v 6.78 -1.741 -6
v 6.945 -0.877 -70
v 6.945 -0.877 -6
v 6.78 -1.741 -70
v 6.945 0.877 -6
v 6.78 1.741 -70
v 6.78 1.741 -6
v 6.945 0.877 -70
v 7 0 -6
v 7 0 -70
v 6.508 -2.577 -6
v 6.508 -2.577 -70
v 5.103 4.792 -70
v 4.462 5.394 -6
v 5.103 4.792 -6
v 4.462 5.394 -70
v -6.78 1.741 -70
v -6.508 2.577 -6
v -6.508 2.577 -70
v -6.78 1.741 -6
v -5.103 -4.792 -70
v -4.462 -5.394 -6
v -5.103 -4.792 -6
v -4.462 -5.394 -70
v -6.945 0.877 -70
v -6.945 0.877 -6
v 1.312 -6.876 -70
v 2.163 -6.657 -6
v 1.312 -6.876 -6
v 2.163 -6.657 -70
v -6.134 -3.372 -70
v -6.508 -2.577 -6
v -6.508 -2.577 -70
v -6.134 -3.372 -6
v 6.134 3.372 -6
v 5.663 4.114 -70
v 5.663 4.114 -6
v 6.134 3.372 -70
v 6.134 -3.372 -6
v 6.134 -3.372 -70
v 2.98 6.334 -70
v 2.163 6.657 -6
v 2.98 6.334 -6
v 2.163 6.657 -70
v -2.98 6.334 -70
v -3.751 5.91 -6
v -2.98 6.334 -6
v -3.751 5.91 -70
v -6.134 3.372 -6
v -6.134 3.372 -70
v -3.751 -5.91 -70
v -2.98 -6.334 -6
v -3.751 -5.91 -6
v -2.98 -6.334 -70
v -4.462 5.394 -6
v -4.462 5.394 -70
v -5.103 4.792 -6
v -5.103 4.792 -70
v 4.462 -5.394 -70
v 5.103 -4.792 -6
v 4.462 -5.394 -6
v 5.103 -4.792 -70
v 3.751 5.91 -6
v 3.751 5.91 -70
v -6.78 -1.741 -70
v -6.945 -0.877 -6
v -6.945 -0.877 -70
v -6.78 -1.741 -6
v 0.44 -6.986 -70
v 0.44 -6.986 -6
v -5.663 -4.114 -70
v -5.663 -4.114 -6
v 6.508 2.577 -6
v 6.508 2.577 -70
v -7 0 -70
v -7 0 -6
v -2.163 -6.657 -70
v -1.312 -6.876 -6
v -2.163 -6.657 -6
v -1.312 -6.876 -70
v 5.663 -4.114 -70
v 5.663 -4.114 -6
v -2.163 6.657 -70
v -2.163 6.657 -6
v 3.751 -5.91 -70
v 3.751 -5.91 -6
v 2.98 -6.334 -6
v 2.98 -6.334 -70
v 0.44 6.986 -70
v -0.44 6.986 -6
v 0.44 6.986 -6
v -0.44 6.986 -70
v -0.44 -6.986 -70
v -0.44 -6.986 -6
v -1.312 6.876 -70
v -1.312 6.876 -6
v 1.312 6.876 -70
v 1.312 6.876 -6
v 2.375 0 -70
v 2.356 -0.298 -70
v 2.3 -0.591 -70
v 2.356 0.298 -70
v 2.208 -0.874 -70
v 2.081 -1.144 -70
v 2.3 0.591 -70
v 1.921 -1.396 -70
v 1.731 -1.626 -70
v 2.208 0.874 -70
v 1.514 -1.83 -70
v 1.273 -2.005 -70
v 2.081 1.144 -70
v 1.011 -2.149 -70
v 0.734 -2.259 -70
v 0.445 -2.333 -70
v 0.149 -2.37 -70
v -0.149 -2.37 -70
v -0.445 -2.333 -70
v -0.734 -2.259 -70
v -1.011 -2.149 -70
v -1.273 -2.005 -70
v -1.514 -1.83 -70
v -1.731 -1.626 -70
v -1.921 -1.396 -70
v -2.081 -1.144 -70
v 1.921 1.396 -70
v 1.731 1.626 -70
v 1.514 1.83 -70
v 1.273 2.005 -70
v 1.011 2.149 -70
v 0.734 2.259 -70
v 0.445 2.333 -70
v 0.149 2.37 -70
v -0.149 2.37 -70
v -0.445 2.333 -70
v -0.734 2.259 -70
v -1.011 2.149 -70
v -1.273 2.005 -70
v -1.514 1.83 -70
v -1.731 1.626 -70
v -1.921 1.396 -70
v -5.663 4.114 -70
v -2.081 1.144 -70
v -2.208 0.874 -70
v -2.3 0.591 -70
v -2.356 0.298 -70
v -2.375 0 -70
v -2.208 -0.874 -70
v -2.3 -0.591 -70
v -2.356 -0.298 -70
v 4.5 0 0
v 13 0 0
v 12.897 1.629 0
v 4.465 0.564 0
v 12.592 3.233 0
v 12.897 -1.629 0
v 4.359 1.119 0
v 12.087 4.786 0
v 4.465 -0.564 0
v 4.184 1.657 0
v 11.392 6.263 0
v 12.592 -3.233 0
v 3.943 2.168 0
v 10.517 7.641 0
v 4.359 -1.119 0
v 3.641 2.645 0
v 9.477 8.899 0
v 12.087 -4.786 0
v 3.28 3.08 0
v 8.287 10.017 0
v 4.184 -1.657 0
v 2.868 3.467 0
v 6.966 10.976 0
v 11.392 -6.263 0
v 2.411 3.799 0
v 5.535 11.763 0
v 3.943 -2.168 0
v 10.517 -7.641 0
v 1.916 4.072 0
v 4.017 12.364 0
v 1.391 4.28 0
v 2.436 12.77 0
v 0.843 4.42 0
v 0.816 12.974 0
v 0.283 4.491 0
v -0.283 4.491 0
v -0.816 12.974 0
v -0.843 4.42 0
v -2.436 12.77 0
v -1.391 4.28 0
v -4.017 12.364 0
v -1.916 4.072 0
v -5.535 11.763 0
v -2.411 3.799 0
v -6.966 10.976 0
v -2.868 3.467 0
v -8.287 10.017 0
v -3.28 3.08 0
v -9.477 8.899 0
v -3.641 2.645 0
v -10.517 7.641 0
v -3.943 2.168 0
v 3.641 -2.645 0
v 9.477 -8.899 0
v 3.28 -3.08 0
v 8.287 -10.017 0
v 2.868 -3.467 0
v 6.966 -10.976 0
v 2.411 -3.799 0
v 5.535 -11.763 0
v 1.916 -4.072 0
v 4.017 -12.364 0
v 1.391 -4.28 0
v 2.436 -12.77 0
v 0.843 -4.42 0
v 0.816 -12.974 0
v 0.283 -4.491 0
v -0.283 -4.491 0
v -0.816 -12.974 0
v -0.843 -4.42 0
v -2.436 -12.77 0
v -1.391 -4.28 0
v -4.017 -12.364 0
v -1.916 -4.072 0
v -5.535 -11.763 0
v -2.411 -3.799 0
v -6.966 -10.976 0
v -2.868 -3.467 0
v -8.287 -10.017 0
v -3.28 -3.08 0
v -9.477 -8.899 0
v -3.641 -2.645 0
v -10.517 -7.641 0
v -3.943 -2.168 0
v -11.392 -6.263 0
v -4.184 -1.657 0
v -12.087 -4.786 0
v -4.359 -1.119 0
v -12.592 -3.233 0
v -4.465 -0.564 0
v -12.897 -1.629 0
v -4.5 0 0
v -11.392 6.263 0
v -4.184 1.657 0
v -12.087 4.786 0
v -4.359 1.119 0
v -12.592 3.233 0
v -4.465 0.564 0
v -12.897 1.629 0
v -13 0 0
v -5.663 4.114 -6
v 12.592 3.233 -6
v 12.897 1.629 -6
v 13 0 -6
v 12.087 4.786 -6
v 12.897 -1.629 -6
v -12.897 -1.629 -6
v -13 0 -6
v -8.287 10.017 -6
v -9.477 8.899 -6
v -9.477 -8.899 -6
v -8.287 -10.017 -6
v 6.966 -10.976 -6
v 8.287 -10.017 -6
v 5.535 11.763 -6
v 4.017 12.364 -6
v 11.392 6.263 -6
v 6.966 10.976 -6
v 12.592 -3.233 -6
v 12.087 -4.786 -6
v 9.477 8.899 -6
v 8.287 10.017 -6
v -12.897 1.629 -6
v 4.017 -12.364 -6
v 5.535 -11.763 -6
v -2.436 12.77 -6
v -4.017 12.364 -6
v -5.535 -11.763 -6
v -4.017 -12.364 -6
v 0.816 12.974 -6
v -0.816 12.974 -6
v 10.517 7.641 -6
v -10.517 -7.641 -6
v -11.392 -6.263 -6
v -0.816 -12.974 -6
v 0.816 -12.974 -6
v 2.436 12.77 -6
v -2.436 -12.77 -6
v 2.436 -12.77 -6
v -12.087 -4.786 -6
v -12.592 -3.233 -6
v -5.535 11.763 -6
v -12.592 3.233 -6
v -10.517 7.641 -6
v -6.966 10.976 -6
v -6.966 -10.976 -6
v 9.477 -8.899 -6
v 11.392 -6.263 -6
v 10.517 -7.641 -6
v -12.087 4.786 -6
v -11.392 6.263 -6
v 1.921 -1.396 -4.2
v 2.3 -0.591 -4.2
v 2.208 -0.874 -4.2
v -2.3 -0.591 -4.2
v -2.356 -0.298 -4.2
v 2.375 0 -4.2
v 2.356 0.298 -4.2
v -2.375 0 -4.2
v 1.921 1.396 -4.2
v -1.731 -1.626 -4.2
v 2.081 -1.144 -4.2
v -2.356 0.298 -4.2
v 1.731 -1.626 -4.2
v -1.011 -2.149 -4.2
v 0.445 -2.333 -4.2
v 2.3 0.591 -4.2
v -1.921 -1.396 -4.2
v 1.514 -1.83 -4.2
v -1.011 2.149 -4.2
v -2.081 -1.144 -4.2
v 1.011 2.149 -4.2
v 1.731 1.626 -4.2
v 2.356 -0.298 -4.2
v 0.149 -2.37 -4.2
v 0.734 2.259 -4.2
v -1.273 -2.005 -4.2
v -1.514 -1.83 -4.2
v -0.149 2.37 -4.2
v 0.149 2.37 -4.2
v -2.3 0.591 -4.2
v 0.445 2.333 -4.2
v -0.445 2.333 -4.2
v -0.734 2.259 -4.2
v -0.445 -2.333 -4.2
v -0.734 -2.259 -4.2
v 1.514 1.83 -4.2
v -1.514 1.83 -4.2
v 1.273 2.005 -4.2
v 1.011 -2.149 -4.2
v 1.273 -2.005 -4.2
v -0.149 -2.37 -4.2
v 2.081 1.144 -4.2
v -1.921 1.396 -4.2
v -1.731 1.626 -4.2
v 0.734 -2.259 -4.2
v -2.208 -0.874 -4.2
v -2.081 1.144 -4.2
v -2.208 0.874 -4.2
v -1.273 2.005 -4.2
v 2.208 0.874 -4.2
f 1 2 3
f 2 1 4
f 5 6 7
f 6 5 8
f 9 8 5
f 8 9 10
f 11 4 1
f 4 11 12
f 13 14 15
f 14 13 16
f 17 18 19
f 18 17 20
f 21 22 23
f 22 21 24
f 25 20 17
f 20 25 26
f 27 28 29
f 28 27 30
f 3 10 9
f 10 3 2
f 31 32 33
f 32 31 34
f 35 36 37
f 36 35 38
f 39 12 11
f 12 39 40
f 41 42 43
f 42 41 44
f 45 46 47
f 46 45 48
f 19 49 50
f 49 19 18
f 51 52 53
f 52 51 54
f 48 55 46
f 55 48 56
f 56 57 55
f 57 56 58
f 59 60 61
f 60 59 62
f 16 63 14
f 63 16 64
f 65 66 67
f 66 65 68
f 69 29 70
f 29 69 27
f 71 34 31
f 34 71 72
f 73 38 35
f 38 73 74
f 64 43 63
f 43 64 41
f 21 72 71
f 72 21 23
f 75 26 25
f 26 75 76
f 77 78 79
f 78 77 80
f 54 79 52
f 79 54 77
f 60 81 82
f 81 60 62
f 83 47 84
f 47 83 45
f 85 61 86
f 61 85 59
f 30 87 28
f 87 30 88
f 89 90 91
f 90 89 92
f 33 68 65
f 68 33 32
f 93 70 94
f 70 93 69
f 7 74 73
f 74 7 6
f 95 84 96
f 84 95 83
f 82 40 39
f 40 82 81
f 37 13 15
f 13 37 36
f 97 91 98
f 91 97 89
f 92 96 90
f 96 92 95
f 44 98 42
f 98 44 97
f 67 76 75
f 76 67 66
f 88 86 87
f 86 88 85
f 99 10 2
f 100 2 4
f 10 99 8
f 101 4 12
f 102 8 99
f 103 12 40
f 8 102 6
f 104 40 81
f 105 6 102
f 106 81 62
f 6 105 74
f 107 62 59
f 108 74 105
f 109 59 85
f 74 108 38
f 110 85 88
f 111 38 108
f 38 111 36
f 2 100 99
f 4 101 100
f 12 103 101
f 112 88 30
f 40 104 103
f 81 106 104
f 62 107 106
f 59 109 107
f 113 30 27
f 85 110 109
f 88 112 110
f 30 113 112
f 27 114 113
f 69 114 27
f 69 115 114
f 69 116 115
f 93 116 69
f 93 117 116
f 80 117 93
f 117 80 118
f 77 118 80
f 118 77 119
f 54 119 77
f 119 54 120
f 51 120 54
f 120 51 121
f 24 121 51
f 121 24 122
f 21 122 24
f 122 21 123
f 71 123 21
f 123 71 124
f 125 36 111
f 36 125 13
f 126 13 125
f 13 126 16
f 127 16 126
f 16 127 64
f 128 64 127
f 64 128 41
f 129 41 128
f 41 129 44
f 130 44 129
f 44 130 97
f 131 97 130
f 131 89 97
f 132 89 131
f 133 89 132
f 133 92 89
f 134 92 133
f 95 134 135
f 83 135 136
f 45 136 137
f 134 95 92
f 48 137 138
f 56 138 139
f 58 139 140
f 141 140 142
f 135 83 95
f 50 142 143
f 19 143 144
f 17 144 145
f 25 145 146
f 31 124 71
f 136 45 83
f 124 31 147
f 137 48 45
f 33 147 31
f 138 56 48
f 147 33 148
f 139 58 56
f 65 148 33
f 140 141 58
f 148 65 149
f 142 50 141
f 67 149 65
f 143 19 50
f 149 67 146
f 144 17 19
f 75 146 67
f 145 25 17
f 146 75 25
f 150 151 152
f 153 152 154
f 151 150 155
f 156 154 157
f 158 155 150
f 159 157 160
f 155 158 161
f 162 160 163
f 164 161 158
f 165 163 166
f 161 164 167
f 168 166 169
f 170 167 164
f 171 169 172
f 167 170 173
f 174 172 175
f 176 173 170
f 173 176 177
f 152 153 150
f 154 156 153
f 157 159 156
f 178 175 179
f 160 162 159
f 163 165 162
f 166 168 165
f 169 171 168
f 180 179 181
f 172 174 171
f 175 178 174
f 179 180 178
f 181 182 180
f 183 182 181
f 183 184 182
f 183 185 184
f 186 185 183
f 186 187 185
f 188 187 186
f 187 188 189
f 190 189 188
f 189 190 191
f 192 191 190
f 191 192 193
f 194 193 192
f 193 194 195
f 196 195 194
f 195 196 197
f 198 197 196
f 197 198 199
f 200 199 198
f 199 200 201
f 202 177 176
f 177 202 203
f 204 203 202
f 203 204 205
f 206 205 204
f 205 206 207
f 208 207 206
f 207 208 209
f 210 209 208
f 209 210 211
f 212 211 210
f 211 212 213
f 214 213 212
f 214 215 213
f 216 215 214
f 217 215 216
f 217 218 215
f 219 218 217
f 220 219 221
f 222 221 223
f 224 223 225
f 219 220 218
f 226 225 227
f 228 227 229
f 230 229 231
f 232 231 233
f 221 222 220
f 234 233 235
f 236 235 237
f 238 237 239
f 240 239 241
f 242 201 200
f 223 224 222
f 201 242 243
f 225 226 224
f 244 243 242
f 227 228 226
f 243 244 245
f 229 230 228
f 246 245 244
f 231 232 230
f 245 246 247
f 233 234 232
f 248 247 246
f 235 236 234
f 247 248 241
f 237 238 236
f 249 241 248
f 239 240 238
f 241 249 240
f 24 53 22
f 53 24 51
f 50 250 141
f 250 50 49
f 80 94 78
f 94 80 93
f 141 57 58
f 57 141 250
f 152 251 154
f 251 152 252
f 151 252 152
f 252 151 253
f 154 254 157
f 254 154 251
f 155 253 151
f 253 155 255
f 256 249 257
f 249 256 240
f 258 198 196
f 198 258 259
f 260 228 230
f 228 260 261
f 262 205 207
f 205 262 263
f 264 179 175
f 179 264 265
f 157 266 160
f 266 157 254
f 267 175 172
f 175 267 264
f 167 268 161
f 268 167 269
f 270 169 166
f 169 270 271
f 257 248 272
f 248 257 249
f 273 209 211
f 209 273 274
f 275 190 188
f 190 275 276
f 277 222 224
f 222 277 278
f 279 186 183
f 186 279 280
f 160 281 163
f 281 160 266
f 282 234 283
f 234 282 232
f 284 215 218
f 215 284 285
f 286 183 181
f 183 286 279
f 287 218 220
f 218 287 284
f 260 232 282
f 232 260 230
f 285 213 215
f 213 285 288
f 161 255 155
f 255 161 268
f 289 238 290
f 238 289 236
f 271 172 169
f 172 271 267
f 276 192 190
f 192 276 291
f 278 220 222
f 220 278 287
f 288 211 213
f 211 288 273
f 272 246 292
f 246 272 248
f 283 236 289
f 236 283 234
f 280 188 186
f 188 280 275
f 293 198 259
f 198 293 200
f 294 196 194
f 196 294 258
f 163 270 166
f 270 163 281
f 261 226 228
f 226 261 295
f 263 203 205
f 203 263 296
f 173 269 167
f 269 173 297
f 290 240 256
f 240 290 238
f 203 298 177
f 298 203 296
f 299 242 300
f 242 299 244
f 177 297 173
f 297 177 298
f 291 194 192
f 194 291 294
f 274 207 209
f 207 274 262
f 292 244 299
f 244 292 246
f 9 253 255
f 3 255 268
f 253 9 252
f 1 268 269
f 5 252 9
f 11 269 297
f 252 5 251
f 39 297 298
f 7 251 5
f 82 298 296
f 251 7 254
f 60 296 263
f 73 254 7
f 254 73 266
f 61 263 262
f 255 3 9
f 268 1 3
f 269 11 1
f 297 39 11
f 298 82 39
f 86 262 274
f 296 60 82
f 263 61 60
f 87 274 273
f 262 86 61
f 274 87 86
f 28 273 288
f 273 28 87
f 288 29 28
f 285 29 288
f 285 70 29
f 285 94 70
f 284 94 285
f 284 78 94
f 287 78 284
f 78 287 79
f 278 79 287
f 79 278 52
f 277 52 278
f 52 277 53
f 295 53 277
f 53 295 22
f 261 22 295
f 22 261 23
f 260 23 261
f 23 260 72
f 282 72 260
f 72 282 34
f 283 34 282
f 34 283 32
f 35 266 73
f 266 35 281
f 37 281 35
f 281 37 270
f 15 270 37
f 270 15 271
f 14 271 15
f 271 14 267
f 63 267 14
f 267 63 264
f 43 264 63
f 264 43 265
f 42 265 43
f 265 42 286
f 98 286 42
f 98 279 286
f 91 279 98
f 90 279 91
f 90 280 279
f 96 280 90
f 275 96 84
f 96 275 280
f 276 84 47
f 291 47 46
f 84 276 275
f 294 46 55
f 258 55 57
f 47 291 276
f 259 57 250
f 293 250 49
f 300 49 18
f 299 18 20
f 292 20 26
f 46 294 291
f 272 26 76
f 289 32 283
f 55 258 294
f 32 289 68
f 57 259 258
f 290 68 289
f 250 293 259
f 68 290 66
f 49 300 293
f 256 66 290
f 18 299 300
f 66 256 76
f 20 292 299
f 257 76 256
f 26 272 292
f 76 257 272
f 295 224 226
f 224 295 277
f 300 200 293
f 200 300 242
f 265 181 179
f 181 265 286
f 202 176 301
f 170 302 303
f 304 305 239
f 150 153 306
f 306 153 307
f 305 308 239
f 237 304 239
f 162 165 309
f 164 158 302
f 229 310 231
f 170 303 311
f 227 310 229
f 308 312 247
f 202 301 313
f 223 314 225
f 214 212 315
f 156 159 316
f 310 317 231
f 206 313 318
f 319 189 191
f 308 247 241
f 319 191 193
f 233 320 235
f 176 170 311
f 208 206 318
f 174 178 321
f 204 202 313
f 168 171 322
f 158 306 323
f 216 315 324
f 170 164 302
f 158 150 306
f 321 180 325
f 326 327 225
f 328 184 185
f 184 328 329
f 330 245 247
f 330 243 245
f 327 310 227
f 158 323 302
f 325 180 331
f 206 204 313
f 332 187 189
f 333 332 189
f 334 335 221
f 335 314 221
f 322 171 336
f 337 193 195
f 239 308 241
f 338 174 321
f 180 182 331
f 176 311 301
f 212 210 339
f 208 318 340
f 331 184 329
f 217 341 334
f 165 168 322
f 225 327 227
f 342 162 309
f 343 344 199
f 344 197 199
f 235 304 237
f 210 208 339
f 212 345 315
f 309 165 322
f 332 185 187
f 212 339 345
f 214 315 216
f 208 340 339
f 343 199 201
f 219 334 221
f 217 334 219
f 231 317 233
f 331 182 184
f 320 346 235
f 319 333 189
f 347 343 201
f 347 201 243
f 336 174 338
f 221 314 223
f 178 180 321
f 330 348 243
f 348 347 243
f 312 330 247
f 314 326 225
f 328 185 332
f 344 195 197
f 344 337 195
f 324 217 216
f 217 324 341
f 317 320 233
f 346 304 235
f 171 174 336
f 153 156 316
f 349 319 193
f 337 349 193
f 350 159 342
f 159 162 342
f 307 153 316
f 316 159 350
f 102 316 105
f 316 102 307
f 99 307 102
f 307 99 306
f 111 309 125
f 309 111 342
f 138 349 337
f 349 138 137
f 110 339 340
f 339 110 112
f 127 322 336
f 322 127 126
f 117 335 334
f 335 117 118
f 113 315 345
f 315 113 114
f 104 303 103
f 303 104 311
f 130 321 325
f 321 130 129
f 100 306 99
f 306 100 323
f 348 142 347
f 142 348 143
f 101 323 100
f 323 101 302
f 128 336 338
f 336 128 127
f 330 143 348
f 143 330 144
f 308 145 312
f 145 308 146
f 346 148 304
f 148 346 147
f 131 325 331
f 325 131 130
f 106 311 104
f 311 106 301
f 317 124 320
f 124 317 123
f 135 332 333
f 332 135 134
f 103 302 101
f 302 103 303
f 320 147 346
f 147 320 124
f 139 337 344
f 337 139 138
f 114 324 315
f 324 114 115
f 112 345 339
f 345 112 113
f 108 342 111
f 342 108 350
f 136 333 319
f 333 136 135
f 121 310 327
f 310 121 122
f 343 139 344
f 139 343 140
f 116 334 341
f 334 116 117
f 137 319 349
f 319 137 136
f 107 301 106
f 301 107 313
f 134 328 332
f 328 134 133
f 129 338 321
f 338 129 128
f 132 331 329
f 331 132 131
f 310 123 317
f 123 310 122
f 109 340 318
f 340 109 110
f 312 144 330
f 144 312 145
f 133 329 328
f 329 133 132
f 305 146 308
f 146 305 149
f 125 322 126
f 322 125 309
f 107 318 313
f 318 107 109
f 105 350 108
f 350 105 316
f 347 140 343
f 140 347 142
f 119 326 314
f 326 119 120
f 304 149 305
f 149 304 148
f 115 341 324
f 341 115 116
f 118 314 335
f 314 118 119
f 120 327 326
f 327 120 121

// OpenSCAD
$fn = 50;


difference() {
	union() {
		translate(v = [0, 0, -70.0000000000]) {
			cylinder(h = 70, r = 7.0000000000);
		}
		translate(v = [0, 0, -6.0000000000]) {
			cylinder(h = 6, r = 13.0000000000);
		}
	}
	union() {
		translate(v = [0, 0, 0]) {
			rotate(a = [0, 0, 0]) {
				difference() {
					union() {
						#translate(v = [0, 0, -70.0000000000]) {
							cylinder(h = 70, r = 2.2500000000);
						}
						#translate(v = [0, 0, -4.2000000000]) {
							cylinder(h = 4.2000000000, r = 7.0000000000, r1 = 2.3750000000, r2 = 4.5000000000);
						}
						#translate(v = [0, 0, -70.0000000000]) {
							cylinder(h = 70, r = 2.3750000000);
						}
						#translate(v = [0, 0, -70.0000000000]) {
							cylinder(h = 70, r = 2.2500000000);
						}
					}
					union();
				}
			}
		}
	}
}
